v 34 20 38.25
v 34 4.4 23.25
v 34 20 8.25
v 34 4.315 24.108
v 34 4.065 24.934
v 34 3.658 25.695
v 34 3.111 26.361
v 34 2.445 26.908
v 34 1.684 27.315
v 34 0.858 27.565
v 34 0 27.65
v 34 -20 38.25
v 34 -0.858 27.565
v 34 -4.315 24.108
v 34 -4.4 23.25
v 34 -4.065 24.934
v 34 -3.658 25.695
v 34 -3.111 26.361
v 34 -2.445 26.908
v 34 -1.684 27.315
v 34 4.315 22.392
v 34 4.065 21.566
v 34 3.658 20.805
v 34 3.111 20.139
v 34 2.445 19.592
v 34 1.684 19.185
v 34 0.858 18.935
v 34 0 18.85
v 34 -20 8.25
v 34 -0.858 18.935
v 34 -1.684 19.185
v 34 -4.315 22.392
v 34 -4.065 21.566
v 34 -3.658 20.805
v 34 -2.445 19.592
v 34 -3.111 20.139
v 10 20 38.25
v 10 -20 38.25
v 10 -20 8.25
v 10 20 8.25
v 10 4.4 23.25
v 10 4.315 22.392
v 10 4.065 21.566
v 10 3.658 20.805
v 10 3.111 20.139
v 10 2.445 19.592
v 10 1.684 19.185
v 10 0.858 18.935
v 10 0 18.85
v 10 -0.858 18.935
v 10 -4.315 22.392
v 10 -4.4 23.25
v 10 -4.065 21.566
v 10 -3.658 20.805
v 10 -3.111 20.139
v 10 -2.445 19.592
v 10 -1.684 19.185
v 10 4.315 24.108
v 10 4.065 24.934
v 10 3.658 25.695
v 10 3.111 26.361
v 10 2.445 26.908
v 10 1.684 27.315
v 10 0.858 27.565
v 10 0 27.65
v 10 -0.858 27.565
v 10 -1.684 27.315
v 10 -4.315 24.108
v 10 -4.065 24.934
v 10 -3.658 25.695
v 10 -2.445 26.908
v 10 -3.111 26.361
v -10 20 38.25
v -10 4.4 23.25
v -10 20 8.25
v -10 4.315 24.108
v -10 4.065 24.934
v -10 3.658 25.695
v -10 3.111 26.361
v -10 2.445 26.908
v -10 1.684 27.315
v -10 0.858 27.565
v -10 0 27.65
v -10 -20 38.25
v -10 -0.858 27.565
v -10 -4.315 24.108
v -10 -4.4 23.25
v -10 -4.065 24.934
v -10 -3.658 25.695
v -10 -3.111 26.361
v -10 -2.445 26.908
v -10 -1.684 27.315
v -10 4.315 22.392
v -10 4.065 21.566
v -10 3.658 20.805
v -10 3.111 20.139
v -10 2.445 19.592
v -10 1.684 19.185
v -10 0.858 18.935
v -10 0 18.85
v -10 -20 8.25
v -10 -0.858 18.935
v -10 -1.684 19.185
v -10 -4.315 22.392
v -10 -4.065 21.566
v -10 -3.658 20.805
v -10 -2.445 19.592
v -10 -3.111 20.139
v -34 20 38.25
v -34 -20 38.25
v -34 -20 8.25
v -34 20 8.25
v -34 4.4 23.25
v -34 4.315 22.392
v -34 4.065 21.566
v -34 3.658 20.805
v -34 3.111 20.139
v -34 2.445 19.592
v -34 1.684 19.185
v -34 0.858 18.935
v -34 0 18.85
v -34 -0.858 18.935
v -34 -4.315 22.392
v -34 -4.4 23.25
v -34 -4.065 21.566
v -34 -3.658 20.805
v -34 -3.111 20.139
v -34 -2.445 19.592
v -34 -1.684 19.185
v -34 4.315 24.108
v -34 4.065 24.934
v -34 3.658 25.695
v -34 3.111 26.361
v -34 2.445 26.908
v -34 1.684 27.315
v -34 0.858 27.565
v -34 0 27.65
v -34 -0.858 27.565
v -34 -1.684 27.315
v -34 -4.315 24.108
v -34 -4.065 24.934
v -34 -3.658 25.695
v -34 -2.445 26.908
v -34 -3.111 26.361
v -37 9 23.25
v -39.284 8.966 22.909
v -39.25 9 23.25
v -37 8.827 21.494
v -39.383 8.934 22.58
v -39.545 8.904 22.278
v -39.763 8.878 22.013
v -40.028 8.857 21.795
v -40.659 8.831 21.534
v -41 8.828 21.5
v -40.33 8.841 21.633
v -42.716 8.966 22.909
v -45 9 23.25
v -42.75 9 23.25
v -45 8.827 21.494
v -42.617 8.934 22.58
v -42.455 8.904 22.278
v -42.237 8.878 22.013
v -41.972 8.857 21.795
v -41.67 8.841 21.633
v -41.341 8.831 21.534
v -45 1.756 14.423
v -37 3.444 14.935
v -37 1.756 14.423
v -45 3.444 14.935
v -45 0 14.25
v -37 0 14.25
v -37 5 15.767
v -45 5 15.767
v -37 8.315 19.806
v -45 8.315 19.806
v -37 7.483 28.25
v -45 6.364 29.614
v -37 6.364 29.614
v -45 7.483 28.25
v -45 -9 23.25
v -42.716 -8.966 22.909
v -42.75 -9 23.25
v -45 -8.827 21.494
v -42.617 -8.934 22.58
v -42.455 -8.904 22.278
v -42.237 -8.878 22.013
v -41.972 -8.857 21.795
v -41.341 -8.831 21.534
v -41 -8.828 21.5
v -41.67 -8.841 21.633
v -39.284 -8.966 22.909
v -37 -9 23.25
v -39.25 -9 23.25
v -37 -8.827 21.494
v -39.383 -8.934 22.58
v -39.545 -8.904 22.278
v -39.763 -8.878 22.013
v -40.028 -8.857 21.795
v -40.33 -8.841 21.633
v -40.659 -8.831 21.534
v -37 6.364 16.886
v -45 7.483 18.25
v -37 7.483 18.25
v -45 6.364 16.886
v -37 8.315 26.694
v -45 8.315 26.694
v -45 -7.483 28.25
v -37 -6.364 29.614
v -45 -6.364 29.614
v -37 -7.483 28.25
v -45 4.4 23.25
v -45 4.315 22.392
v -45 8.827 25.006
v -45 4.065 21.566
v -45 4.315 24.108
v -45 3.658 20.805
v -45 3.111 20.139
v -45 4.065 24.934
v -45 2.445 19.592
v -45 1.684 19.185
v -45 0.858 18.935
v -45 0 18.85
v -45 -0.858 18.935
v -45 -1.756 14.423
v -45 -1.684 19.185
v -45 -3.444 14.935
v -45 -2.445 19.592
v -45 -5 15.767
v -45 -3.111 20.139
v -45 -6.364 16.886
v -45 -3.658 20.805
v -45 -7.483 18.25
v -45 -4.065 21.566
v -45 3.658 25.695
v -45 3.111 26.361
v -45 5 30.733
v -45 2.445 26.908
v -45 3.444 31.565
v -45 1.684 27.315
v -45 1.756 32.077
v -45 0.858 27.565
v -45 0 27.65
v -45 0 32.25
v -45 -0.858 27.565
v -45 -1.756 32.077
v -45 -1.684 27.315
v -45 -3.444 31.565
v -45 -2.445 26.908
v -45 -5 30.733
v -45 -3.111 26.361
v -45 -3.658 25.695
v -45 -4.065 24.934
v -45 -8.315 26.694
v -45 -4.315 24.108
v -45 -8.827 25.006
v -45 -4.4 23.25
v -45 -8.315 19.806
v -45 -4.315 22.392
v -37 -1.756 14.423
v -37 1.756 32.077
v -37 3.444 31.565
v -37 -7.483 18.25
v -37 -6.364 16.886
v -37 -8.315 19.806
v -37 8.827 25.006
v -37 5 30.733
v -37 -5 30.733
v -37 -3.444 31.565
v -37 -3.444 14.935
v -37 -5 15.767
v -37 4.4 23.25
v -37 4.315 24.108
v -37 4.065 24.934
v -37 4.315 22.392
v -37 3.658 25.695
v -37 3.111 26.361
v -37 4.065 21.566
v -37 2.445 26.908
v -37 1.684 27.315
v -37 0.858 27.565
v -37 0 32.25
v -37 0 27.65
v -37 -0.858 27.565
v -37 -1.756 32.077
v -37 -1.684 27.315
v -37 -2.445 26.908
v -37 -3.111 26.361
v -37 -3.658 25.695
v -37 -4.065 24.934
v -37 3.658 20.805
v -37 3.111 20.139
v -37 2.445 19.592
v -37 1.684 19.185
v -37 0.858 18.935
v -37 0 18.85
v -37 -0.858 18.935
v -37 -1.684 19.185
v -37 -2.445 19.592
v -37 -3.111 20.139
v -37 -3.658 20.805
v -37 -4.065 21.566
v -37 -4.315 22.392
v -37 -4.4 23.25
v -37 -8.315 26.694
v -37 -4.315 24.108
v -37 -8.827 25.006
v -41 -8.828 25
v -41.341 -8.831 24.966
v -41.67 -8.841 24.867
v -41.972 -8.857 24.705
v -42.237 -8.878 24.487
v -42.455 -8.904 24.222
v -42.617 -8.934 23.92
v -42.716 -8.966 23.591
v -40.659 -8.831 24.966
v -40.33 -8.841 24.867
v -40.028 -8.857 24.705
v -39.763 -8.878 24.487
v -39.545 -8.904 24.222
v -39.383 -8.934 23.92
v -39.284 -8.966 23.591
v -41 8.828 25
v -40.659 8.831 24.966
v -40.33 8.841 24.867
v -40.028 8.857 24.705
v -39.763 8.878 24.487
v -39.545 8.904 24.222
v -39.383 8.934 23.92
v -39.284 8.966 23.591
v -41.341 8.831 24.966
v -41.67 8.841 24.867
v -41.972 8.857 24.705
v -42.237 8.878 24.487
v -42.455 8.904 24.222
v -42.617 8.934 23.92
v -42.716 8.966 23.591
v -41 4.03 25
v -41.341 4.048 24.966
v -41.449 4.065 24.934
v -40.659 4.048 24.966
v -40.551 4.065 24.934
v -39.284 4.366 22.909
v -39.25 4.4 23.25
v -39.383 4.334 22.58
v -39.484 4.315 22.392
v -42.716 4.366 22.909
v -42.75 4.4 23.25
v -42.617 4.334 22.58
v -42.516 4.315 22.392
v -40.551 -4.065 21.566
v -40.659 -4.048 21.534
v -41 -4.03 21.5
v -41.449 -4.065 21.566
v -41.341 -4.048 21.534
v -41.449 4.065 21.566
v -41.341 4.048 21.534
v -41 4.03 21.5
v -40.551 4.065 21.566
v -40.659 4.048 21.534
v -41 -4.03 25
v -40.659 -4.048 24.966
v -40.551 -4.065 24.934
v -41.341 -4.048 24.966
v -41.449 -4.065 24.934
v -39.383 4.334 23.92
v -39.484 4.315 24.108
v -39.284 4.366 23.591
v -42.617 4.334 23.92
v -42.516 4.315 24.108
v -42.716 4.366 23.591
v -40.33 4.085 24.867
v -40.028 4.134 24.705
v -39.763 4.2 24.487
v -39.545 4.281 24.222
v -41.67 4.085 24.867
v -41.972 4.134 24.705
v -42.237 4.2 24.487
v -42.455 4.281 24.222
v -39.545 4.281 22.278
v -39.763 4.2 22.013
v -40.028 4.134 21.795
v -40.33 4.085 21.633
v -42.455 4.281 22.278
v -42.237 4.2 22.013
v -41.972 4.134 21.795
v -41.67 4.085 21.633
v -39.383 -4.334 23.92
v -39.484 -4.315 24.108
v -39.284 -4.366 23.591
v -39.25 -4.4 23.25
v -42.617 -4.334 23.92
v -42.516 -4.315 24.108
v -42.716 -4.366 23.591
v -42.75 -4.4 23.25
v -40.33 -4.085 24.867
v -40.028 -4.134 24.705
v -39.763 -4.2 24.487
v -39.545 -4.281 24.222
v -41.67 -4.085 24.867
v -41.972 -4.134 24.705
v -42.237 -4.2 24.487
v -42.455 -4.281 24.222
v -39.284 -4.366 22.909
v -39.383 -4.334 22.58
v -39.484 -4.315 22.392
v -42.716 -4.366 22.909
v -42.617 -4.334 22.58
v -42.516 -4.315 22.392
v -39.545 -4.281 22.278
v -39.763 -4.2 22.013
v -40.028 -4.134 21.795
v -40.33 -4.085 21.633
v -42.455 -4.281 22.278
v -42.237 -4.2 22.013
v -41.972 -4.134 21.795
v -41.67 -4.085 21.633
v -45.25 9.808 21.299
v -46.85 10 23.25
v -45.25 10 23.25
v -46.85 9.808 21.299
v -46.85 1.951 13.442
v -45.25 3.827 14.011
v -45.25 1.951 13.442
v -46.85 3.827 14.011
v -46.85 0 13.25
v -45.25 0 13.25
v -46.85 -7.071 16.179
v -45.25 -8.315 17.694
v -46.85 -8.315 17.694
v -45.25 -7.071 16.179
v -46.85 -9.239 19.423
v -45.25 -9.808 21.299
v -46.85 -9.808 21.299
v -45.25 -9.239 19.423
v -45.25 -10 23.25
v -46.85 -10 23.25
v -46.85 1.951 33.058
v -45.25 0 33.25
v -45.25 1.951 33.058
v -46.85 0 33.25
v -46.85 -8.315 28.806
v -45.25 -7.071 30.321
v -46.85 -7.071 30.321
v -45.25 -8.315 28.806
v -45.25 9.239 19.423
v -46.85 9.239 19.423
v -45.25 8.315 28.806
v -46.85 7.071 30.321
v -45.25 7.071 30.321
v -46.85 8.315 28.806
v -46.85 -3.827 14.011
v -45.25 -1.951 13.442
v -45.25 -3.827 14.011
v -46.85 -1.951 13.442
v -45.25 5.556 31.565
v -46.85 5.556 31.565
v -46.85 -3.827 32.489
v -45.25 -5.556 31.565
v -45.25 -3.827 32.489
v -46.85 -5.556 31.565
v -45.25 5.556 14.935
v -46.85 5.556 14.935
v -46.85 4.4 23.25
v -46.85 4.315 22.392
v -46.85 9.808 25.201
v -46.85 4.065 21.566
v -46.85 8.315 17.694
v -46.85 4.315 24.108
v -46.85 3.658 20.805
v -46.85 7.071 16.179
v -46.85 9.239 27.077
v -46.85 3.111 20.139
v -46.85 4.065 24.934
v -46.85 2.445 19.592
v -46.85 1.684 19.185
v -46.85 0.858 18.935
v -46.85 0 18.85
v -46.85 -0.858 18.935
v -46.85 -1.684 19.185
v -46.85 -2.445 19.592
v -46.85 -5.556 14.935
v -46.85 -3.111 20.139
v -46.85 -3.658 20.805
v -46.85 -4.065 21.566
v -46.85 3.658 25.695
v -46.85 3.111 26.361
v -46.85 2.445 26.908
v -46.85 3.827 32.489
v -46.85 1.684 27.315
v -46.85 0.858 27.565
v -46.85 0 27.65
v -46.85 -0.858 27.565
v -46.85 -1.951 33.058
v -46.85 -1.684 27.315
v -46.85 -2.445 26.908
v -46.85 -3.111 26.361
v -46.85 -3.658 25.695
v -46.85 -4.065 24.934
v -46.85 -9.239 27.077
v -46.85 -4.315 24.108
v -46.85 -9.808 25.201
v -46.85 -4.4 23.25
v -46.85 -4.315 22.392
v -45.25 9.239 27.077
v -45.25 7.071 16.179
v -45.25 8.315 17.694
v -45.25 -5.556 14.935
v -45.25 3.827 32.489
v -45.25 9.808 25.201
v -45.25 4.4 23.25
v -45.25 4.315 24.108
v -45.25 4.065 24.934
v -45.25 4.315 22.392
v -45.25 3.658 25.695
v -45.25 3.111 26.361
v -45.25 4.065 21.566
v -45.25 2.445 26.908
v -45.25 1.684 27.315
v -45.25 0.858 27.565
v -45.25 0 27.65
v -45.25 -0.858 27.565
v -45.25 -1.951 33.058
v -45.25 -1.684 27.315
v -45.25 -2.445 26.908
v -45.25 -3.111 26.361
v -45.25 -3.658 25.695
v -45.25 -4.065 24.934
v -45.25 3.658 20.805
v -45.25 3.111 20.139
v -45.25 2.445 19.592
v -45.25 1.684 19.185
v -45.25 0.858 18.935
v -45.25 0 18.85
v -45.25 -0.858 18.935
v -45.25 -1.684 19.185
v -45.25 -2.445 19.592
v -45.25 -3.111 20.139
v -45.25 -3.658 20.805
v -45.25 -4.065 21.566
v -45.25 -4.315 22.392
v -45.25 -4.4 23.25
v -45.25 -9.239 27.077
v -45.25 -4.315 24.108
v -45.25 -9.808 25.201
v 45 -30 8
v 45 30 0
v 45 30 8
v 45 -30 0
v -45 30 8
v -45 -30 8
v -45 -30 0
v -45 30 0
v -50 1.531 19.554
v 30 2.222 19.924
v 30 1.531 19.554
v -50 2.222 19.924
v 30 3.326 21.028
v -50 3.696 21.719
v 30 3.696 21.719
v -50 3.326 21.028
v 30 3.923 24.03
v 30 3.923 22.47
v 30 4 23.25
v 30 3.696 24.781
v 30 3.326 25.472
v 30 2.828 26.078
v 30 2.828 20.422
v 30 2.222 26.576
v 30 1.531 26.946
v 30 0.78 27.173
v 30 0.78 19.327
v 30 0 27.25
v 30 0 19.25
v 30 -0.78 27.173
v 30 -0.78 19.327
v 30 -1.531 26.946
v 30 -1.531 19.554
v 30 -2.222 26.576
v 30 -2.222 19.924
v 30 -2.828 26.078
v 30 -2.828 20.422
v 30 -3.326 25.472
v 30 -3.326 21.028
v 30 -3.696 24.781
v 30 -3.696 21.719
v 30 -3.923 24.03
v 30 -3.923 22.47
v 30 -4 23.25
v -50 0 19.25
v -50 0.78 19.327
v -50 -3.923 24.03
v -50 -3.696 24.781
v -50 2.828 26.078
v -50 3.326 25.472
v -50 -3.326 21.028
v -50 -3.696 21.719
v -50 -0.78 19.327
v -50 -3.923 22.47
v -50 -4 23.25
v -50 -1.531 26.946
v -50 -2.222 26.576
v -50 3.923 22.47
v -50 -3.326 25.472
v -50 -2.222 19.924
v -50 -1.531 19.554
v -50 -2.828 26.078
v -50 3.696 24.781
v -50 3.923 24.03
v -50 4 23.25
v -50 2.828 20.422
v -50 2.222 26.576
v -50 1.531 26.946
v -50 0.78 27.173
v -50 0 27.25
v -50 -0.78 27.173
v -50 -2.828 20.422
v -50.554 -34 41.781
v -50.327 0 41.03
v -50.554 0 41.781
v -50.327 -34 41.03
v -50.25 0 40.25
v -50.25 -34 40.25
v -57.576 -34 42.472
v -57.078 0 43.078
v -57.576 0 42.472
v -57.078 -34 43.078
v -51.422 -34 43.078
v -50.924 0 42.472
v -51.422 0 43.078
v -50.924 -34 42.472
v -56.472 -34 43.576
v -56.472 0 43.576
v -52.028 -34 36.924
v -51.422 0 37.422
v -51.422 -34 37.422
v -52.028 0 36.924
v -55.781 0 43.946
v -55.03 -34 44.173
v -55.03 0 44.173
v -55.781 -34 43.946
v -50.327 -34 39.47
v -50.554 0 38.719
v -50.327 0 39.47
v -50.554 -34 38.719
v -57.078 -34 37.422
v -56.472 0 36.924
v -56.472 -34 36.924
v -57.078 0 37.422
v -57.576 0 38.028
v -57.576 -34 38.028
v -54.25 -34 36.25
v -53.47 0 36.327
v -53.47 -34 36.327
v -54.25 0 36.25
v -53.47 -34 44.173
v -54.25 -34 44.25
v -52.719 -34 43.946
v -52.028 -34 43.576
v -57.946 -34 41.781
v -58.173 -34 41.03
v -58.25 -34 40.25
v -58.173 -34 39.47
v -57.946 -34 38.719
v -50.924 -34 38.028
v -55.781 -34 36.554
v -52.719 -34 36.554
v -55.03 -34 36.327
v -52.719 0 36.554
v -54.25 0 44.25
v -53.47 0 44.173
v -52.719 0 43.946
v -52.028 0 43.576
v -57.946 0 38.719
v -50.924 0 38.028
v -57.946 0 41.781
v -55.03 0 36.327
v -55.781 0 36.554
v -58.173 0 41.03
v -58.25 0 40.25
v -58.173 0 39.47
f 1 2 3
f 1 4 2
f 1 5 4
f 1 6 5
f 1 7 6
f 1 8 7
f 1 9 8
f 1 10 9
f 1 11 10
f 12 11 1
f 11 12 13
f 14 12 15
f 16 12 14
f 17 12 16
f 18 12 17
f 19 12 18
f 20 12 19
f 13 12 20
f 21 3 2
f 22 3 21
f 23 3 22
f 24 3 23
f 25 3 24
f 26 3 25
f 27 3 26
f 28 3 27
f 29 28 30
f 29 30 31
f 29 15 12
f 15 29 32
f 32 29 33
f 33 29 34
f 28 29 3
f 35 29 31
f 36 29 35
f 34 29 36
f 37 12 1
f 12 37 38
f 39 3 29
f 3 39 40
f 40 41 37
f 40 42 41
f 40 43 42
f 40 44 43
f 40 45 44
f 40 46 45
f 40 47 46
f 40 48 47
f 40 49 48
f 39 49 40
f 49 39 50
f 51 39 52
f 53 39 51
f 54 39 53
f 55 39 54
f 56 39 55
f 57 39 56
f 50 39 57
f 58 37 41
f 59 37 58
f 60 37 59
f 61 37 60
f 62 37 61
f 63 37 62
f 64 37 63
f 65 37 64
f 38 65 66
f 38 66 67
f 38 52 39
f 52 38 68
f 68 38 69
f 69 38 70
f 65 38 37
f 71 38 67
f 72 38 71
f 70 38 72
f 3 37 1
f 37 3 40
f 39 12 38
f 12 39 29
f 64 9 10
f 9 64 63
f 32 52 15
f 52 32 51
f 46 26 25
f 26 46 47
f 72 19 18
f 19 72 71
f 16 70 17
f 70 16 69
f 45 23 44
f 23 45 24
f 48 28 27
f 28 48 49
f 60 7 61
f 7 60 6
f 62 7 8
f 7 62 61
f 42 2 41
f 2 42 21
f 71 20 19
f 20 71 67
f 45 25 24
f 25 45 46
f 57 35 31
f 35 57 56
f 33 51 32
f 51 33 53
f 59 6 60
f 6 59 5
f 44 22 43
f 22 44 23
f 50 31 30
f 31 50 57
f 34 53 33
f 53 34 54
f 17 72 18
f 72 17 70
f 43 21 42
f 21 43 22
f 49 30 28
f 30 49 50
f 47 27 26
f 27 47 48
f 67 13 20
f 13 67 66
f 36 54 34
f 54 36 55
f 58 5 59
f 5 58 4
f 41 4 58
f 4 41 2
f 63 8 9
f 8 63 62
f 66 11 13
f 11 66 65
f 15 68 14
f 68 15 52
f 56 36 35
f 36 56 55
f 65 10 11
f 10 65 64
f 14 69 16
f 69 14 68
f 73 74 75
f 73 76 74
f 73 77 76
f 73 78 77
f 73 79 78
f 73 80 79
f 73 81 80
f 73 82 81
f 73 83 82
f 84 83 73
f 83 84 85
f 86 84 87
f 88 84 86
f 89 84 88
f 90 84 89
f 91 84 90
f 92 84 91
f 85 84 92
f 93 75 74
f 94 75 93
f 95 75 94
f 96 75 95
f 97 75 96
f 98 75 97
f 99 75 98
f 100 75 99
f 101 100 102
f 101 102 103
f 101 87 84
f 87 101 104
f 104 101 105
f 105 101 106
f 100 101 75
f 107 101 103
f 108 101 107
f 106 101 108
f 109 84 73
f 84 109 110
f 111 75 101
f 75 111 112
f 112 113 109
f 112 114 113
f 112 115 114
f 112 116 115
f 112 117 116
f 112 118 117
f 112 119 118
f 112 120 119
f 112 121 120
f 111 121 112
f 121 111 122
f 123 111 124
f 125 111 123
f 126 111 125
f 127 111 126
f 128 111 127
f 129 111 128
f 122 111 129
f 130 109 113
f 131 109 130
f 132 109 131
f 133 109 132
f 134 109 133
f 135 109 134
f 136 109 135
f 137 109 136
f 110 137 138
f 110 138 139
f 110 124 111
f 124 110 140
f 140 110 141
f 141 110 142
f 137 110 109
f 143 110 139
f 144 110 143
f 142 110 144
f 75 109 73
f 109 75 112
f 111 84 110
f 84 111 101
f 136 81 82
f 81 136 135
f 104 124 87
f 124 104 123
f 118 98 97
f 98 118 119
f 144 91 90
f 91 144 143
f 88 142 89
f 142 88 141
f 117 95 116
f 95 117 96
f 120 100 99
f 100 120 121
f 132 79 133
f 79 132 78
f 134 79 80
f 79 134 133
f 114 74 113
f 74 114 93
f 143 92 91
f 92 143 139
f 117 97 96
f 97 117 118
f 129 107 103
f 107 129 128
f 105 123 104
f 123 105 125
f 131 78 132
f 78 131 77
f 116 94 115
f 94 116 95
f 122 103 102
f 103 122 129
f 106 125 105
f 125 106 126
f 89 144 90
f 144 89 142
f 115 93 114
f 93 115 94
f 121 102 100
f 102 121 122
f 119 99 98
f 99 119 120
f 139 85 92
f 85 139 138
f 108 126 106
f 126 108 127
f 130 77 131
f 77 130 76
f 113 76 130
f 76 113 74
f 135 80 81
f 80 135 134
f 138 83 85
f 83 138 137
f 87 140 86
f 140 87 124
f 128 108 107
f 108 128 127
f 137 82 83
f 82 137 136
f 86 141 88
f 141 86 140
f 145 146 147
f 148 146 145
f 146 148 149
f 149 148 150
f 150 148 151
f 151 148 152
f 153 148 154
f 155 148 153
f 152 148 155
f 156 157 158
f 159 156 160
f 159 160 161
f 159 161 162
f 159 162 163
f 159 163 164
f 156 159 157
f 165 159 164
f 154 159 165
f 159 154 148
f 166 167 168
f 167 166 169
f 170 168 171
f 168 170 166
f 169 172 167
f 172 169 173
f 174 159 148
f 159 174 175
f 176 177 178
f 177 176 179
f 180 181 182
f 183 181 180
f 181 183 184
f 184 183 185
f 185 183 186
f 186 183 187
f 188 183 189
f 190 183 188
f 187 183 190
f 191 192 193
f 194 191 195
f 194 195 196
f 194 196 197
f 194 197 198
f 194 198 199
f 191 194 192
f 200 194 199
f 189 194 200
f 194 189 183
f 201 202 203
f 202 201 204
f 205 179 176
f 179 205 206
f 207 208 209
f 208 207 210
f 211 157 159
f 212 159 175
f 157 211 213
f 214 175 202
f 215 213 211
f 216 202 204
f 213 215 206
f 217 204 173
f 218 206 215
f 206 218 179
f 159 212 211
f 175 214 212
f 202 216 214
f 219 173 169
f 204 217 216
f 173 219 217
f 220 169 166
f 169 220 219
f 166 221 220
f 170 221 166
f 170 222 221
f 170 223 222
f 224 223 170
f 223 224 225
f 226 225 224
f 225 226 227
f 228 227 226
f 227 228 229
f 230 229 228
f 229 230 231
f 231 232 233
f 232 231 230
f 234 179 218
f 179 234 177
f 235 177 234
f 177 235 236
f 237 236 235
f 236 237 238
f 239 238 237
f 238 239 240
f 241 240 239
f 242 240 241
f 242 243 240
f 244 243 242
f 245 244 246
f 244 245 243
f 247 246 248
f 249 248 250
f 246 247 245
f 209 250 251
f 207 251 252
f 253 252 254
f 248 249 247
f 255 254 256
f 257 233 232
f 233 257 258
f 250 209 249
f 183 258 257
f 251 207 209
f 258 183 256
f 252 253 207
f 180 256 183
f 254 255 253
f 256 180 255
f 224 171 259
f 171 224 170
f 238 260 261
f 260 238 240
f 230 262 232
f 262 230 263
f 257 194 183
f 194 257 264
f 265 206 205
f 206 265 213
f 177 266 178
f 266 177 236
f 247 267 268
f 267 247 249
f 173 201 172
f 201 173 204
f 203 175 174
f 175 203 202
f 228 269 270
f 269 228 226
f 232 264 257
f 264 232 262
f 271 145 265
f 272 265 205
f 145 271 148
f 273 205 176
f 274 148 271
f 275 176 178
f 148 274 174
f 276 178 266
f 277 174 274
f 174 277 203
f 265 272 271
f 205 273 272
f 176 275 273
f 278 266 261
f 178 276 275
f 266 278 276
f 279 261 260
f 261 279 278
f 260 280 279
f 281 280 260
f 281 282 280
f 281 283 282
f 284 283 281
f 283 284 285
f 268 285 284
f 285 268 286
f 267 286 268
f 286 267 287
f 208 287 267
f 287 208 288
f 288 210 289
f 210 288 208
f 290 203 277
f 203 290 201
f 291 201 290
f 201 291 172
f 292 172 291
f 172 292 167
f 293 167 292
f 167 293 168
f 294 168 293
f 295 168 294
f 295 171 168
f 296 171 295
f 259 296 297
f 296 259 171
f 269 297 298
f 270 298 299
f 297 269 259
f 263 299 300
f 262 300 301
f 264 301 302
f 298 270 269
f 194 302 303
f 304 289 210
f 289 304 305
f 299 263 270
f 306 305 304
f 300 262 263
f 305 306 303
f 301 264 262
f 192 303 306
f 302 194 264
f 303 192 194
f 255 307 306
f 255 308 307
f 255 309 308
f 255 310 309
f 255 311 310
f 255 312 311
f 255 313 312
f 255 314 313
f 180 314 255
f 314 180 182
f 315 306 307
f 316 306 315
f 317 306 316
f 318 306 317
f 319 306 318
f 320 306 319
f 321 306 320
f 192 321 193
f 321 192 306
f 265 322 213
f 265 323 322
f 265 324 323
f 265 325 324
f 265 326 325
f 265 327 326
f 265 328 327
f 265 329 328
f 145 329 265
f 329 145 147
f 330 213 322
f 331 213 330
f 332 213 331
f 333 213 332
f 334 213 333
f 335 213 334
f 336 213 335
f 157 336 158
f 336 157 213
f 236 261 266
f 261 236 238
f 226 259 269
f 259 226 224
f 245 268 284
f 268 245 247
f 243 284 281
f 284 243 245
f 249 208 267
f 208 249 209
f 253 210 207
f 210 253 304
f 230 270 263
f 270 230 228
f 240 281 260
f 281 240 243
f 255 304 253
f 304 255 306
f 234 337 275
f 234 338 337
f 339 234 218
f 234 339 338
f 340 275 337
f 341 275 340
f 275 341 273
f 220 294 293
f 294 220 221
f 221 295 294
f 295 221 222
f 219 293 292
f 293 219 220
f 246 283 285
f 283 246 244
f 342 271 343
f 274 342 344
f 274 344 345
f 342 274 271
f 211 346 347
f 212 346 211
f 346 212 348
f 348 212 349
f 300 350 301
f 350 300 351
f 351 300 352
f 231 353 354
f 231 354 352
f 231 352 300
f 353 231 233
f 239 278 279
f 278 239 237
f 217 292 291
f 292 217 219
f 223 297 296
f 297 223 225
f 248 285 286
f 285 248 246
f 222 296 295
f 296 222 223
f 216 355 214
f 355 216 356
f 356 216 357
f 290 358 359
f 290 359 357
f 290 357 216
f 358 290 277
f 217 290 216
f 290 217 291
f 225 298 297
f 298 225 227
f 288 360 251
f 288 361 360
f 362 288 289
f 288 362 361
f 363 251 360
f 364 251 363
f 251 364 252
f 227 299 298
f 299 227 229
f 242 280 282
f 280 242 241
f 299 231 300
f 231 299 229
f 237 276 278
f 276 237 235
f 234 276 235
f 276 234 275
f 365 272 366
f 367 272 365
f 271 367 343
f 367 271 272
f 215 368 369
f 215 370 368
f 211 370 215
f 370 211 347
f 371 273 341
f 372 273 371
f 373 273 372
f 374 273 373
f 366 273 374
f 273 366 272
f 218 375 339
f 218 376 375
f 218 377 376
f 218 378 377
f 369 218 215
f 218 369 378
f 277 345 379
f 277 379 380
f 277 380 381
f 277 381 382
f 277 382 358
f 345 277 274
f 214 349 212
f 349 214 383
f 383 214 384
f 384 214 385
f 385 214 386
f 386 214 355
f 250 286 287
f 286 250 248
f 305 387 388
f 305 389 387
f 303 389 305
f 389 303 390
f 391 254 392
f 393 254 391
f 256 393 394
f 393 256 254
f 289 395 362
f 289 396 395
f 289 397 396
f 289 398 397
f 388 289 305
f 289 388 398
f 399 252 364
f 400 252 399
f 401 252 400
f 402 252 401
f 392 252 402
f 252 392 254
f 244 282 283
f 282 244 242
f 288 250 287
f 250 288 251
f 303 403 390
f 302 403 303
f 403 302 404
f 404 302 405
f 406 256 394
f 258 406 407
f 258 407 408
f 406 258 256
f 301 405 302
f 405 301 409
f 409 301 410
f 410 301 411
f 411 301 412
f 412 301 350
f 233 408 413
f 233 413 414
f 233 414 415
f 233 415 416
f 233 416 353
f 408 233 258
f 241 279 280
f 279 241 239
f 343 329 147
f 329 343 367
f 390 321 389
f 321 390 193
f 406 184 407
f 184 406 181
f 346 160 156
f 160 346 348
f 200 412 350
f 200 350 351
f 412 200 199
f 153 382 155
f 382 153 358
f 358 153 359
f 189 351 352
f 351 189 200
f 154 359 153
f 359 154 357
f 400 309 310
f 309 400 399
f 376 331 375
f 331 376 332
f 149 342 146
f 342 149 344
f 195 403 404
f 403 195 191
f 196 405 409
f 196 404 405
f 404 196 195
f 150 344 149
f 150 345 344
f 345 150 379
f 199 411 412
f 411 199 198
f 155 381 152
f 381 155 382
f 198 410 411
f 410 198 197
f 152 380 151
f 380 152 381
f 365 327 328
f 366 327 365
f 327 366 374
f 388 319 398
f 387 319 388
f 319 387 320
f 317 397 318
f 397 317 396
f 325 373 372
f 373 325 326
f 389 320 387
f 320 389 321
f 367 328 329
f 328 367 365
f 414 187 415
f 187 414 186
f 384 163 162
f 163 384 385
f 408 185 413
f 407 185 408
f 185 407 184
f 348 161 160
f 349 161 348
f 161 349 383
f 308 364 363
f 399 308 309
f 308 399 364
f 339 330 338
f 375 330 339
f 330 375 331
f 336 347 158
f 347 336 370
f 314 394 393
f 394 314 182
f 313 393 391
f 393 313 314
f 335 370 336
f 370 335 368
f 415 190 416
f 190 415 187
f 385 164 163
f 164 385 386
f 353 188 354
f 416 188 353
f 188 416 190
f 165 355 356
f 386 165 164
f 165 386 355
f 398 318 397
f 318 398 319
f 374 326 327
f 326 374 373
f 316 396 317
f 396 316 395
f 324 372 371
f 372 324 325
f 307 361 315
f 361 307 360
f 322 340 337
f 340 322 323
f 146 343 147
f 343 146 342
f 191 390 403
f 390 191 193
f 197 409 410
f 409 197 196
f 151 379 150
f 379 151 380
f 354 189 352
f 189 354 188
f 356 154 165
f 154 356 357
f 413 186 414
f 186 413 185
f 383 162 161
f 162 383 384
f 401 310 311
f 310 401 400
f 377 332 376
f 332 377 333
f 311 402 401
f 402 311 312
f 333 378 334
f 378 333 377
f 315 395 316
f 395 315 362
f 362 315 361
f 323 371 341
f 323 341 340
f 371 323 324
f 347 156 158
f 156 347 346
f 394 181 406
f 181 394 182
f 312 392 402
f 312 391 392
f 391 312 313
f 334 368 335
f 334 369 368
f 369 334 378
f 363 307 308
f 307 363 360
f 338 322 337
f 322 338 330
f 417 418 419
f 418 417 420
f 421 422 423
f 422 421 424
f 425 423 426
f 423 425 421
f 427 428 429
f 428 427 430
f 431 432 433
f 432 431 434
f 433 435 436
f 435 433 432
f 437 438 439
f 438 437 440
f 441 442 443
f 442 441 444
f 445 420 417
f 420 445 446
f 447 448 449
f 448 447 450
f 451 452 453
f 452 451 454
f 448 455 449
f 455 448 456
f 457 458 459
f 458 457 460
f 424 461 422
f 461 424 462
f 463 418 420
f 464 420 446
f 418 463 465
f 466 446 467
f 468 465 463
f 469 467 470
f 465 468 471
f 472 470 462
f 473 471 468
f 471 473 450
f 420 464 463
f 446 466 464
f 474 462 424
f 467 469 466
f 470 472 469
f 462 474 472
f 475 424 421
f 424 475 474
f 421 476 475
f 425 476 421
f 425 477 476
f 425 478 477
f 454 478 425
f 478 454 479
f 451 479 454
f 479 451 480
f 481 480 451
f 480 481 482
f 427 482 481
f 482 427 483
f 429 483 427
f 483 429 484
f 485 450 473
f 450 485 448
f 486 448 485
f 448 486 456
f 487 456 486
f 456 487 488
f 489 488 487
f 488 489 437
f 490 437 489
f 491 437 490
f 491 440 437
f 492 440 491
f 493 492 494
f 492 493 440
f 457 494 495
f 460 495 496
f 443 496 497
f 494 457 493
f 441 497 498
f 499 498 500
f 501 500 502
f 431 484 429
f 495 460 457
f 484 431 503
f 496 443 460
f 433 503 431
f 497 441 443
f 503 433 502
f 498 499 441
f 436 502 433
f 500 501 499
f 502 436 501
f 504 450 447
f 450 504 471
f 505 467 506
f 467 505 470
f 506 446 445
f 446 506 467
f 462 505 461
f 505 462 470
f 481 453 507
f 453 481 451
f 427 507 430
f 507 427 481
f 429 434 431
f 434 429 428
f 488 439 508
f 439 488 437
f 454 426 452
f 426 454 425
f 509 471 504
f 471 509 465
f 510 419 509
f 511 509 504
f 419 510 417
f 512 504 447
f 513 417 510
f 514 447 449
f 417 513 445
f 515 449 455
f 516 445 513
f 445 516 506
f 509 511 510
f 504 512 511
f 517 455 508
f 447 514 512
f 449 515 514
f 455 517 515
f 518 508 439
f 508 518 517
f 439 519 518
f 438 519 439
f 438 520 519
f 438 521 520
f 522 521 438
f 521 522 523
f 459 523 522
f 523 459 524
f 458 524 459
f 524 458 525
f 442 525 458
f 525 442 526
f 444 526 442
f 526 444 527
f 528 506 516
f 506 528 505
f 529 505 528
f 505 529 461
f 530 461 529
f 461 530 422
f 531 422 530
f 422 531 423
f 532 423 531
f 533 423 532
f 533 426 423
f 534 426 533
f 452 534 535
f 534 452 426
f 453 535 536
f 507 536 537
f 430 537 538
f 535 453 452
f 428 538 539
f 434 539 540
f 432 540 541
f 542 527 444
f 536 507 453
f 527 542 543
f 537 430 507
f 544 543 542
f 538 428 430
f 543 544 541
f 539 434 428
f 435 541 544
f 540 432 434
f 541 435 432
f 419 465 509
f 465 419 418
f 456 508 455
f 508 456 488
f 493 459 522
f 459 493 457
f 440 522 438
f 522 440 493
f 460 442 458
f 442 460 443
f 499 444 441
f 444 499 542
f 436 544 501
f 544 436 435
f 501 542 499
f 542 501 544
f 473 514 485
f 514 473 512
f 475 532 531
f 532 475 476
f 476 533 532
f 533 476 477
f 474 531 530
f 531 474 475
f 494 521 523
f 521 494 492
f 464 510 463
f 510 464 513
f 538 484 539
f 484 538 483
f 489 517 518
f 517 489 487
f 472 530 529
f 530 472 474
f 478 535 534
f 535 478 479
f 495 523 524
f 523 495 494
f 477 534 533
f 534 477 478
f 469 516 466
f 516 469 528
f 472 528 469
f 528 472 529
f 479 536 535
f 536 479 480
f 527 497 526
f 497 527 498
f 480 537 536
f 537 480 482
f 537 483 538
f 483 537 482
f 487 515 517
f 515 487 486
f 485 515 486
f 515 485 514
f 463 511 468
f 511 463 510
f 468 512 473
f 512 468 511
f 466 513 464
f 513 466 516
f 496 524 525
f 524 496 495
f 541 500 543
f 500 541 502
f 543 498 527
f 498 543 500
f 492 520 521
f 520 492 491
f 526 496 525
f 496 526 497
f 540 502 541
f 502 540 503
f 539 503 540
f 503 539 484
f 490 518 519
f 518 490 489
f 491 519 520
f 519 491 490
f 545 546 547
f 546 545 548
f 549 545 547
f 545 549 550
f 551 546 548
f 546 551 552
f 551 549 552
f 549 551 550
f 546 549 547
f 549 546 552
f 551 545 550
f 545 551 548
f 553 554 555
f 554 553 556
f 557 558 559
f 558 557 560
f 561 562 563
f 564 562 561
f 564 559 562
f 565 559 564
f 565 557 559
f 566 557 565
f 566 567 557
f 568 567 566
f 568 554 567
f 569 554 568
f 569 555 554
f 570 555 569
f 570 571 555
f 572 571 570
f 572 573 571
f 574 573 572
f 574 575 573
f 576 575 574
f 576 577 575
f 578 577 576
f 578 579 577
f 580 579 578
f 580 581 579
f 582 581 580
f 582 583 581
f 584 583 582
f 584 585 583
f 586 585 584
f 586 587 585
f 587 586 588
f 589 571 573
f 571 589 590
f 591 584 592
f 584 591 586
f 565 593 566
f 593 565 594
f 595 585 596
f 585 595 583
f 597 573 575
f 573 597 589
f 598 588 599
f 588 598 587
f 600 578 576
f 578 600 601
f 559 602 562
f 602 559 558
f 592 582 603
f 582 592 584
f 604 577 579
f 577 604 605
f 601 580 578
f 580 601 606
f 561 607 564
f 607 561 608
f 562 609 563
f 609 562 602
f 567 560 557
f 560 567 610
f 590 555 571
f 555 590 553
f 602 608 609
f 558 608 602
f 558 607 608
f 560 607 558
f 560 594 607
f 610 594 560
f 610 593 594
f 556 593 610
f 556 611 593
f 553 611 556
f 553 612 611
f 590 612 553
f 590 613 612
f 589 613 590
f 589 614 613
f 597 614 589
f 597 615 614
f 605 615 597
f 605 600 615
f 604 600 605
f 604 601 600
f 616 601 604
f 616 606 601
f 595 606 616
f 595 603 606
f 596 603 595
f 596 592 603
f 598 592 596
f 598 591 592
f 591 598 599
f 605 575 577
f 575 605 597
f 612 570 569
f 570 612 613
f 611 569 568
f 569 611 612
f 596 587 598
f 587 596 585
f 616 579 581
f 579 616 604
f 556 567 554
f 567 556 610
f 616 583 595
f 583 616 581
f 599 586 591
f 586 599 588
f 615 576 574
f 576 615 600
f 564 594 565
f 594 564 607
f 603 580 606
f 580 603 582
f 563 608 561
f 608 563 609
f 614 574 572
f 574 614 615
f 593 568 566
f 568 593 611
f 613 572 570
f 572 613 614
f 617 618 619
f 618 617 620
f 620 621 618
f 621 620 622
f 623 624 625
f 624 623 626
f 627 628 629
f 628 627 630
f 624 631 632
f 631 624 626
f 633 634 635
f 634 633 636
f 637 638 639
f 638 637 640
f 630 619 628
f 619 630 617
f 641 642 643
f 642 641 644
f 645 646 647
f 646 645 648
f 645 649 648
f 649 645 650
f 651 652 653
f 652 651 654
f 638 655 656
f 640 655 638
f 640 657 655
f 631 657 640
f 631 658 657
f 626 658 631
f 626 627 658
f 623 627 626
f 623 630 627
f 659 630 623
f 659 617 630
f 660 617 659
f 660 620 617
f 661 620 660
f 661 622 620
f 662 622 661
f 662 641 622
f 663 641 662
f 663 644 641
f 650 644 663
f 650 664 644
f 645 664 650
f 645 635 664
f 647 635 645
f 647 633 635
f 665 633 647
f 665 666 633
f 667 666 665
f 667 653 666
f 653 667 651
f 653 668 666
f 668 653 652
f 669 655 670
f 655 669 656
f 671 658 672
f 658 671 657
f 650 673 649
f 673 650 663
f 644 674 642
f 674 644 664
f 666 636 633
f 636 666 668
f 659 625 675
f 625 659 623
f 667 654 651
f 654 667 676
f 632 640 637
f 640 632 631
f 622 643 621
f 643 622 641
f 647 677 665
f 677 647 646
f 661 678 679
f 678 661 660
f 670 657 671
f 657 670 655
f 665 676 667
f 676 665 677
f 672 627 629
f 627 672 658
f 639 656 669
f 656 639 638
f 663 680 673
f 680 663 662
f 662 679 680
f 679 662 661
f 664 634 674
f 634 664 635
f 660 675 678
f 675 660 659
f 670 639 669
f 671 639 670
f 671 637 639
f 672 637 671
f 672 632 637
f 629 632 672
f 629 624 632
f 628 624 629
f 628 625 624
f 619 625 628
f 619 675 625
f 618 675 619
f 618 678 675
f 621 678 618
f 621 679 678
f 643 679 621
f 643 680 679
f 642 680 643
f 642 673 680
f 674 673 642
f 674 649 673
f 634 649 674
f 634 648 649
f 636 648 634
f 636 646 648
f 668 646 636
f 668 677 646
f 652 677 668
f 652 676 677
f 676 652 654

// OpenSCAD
$fn = 32;

// ------------------------------------------------------------------------
// Machine vise: screw d8, jaws 24 x 30 mm
// Every part is its own module, assembly() places every instance.
// ------------------------------------------------------------------------

// --- part 1 ---
module vise_bed() {
  difference() {
    translate([-45, -30, 0]) cube([90, 60, 8]);
  }
}

// --- part 2 ---
module vise_jaw() {
  difference() {
    translate([-12, -20, 0]) cube([24, 40, 30]);
    translate([0, 0, 15]) rotate([0, 90, 0]) cylinder(h = 26, d = 8.8, center = true);
  }
}

// --- part 3 ---
module vise_screw() {
  translate([0, 0, -40]) cylinder(h = 80, d = 8);
}

// --- part 4 ---
module screw_collar() {
  difference() {
    cylinder(h = 8, d = 18);
    translate([0, 0, -1]) cylinder(h = 10, d = 8.8);
    translate([0, 0, 4]) rotate([90, 0, 0]) cylinder(h = 20, d = 3.5, center = true);
  }
}

// --- part 5 ---
module screw_washer() {
  difference() {
      translate([0, 0, 0]) cylinder(h = 1.6, d = 20);
      translate([0, 0, -1]) cylinder(h = 3.6, d = 8.8);
    }
}

// --- part 6 ---
module vise_handle() {
  cylinder(h = 34, d = 8);
}

// --- assembly ---
module assembly() {
  color([0.80, 0.24, 0.20]) translate([0, 0, 0]) rotate([0, 0, 0]) vise_bed();
  color([0.20, 0.45, 0.75]) translate([22, 0, 8.25]) rotate([0, 0, 0]) vise_jaw();
  color([0.25, 0.62, 0.32]) translate([-22, 0, 8.25]) rotate([0, 0, 0]) vise_jaw();
  color([0.92, 0.70, 0.18]) translate([-10, 0, 23.25]) rotate([0, 90, 0]) vise_screw();
  color([0.58, 0.35, 0.70]) translate([-45, 0, 23.25]) rotate([0, 90, 0]) screw_collar();
  color([0.16, 0.66, 0.66]) translate([-46.85, 0, 23.25]) rotate([0, 90, 0]) screw_washer();
  color([0.85, 0.48, 0.18]) translate([-54.25, 0, 40.25]) rotate([90, 0, 0]) vise_handle();
}

assembly();
